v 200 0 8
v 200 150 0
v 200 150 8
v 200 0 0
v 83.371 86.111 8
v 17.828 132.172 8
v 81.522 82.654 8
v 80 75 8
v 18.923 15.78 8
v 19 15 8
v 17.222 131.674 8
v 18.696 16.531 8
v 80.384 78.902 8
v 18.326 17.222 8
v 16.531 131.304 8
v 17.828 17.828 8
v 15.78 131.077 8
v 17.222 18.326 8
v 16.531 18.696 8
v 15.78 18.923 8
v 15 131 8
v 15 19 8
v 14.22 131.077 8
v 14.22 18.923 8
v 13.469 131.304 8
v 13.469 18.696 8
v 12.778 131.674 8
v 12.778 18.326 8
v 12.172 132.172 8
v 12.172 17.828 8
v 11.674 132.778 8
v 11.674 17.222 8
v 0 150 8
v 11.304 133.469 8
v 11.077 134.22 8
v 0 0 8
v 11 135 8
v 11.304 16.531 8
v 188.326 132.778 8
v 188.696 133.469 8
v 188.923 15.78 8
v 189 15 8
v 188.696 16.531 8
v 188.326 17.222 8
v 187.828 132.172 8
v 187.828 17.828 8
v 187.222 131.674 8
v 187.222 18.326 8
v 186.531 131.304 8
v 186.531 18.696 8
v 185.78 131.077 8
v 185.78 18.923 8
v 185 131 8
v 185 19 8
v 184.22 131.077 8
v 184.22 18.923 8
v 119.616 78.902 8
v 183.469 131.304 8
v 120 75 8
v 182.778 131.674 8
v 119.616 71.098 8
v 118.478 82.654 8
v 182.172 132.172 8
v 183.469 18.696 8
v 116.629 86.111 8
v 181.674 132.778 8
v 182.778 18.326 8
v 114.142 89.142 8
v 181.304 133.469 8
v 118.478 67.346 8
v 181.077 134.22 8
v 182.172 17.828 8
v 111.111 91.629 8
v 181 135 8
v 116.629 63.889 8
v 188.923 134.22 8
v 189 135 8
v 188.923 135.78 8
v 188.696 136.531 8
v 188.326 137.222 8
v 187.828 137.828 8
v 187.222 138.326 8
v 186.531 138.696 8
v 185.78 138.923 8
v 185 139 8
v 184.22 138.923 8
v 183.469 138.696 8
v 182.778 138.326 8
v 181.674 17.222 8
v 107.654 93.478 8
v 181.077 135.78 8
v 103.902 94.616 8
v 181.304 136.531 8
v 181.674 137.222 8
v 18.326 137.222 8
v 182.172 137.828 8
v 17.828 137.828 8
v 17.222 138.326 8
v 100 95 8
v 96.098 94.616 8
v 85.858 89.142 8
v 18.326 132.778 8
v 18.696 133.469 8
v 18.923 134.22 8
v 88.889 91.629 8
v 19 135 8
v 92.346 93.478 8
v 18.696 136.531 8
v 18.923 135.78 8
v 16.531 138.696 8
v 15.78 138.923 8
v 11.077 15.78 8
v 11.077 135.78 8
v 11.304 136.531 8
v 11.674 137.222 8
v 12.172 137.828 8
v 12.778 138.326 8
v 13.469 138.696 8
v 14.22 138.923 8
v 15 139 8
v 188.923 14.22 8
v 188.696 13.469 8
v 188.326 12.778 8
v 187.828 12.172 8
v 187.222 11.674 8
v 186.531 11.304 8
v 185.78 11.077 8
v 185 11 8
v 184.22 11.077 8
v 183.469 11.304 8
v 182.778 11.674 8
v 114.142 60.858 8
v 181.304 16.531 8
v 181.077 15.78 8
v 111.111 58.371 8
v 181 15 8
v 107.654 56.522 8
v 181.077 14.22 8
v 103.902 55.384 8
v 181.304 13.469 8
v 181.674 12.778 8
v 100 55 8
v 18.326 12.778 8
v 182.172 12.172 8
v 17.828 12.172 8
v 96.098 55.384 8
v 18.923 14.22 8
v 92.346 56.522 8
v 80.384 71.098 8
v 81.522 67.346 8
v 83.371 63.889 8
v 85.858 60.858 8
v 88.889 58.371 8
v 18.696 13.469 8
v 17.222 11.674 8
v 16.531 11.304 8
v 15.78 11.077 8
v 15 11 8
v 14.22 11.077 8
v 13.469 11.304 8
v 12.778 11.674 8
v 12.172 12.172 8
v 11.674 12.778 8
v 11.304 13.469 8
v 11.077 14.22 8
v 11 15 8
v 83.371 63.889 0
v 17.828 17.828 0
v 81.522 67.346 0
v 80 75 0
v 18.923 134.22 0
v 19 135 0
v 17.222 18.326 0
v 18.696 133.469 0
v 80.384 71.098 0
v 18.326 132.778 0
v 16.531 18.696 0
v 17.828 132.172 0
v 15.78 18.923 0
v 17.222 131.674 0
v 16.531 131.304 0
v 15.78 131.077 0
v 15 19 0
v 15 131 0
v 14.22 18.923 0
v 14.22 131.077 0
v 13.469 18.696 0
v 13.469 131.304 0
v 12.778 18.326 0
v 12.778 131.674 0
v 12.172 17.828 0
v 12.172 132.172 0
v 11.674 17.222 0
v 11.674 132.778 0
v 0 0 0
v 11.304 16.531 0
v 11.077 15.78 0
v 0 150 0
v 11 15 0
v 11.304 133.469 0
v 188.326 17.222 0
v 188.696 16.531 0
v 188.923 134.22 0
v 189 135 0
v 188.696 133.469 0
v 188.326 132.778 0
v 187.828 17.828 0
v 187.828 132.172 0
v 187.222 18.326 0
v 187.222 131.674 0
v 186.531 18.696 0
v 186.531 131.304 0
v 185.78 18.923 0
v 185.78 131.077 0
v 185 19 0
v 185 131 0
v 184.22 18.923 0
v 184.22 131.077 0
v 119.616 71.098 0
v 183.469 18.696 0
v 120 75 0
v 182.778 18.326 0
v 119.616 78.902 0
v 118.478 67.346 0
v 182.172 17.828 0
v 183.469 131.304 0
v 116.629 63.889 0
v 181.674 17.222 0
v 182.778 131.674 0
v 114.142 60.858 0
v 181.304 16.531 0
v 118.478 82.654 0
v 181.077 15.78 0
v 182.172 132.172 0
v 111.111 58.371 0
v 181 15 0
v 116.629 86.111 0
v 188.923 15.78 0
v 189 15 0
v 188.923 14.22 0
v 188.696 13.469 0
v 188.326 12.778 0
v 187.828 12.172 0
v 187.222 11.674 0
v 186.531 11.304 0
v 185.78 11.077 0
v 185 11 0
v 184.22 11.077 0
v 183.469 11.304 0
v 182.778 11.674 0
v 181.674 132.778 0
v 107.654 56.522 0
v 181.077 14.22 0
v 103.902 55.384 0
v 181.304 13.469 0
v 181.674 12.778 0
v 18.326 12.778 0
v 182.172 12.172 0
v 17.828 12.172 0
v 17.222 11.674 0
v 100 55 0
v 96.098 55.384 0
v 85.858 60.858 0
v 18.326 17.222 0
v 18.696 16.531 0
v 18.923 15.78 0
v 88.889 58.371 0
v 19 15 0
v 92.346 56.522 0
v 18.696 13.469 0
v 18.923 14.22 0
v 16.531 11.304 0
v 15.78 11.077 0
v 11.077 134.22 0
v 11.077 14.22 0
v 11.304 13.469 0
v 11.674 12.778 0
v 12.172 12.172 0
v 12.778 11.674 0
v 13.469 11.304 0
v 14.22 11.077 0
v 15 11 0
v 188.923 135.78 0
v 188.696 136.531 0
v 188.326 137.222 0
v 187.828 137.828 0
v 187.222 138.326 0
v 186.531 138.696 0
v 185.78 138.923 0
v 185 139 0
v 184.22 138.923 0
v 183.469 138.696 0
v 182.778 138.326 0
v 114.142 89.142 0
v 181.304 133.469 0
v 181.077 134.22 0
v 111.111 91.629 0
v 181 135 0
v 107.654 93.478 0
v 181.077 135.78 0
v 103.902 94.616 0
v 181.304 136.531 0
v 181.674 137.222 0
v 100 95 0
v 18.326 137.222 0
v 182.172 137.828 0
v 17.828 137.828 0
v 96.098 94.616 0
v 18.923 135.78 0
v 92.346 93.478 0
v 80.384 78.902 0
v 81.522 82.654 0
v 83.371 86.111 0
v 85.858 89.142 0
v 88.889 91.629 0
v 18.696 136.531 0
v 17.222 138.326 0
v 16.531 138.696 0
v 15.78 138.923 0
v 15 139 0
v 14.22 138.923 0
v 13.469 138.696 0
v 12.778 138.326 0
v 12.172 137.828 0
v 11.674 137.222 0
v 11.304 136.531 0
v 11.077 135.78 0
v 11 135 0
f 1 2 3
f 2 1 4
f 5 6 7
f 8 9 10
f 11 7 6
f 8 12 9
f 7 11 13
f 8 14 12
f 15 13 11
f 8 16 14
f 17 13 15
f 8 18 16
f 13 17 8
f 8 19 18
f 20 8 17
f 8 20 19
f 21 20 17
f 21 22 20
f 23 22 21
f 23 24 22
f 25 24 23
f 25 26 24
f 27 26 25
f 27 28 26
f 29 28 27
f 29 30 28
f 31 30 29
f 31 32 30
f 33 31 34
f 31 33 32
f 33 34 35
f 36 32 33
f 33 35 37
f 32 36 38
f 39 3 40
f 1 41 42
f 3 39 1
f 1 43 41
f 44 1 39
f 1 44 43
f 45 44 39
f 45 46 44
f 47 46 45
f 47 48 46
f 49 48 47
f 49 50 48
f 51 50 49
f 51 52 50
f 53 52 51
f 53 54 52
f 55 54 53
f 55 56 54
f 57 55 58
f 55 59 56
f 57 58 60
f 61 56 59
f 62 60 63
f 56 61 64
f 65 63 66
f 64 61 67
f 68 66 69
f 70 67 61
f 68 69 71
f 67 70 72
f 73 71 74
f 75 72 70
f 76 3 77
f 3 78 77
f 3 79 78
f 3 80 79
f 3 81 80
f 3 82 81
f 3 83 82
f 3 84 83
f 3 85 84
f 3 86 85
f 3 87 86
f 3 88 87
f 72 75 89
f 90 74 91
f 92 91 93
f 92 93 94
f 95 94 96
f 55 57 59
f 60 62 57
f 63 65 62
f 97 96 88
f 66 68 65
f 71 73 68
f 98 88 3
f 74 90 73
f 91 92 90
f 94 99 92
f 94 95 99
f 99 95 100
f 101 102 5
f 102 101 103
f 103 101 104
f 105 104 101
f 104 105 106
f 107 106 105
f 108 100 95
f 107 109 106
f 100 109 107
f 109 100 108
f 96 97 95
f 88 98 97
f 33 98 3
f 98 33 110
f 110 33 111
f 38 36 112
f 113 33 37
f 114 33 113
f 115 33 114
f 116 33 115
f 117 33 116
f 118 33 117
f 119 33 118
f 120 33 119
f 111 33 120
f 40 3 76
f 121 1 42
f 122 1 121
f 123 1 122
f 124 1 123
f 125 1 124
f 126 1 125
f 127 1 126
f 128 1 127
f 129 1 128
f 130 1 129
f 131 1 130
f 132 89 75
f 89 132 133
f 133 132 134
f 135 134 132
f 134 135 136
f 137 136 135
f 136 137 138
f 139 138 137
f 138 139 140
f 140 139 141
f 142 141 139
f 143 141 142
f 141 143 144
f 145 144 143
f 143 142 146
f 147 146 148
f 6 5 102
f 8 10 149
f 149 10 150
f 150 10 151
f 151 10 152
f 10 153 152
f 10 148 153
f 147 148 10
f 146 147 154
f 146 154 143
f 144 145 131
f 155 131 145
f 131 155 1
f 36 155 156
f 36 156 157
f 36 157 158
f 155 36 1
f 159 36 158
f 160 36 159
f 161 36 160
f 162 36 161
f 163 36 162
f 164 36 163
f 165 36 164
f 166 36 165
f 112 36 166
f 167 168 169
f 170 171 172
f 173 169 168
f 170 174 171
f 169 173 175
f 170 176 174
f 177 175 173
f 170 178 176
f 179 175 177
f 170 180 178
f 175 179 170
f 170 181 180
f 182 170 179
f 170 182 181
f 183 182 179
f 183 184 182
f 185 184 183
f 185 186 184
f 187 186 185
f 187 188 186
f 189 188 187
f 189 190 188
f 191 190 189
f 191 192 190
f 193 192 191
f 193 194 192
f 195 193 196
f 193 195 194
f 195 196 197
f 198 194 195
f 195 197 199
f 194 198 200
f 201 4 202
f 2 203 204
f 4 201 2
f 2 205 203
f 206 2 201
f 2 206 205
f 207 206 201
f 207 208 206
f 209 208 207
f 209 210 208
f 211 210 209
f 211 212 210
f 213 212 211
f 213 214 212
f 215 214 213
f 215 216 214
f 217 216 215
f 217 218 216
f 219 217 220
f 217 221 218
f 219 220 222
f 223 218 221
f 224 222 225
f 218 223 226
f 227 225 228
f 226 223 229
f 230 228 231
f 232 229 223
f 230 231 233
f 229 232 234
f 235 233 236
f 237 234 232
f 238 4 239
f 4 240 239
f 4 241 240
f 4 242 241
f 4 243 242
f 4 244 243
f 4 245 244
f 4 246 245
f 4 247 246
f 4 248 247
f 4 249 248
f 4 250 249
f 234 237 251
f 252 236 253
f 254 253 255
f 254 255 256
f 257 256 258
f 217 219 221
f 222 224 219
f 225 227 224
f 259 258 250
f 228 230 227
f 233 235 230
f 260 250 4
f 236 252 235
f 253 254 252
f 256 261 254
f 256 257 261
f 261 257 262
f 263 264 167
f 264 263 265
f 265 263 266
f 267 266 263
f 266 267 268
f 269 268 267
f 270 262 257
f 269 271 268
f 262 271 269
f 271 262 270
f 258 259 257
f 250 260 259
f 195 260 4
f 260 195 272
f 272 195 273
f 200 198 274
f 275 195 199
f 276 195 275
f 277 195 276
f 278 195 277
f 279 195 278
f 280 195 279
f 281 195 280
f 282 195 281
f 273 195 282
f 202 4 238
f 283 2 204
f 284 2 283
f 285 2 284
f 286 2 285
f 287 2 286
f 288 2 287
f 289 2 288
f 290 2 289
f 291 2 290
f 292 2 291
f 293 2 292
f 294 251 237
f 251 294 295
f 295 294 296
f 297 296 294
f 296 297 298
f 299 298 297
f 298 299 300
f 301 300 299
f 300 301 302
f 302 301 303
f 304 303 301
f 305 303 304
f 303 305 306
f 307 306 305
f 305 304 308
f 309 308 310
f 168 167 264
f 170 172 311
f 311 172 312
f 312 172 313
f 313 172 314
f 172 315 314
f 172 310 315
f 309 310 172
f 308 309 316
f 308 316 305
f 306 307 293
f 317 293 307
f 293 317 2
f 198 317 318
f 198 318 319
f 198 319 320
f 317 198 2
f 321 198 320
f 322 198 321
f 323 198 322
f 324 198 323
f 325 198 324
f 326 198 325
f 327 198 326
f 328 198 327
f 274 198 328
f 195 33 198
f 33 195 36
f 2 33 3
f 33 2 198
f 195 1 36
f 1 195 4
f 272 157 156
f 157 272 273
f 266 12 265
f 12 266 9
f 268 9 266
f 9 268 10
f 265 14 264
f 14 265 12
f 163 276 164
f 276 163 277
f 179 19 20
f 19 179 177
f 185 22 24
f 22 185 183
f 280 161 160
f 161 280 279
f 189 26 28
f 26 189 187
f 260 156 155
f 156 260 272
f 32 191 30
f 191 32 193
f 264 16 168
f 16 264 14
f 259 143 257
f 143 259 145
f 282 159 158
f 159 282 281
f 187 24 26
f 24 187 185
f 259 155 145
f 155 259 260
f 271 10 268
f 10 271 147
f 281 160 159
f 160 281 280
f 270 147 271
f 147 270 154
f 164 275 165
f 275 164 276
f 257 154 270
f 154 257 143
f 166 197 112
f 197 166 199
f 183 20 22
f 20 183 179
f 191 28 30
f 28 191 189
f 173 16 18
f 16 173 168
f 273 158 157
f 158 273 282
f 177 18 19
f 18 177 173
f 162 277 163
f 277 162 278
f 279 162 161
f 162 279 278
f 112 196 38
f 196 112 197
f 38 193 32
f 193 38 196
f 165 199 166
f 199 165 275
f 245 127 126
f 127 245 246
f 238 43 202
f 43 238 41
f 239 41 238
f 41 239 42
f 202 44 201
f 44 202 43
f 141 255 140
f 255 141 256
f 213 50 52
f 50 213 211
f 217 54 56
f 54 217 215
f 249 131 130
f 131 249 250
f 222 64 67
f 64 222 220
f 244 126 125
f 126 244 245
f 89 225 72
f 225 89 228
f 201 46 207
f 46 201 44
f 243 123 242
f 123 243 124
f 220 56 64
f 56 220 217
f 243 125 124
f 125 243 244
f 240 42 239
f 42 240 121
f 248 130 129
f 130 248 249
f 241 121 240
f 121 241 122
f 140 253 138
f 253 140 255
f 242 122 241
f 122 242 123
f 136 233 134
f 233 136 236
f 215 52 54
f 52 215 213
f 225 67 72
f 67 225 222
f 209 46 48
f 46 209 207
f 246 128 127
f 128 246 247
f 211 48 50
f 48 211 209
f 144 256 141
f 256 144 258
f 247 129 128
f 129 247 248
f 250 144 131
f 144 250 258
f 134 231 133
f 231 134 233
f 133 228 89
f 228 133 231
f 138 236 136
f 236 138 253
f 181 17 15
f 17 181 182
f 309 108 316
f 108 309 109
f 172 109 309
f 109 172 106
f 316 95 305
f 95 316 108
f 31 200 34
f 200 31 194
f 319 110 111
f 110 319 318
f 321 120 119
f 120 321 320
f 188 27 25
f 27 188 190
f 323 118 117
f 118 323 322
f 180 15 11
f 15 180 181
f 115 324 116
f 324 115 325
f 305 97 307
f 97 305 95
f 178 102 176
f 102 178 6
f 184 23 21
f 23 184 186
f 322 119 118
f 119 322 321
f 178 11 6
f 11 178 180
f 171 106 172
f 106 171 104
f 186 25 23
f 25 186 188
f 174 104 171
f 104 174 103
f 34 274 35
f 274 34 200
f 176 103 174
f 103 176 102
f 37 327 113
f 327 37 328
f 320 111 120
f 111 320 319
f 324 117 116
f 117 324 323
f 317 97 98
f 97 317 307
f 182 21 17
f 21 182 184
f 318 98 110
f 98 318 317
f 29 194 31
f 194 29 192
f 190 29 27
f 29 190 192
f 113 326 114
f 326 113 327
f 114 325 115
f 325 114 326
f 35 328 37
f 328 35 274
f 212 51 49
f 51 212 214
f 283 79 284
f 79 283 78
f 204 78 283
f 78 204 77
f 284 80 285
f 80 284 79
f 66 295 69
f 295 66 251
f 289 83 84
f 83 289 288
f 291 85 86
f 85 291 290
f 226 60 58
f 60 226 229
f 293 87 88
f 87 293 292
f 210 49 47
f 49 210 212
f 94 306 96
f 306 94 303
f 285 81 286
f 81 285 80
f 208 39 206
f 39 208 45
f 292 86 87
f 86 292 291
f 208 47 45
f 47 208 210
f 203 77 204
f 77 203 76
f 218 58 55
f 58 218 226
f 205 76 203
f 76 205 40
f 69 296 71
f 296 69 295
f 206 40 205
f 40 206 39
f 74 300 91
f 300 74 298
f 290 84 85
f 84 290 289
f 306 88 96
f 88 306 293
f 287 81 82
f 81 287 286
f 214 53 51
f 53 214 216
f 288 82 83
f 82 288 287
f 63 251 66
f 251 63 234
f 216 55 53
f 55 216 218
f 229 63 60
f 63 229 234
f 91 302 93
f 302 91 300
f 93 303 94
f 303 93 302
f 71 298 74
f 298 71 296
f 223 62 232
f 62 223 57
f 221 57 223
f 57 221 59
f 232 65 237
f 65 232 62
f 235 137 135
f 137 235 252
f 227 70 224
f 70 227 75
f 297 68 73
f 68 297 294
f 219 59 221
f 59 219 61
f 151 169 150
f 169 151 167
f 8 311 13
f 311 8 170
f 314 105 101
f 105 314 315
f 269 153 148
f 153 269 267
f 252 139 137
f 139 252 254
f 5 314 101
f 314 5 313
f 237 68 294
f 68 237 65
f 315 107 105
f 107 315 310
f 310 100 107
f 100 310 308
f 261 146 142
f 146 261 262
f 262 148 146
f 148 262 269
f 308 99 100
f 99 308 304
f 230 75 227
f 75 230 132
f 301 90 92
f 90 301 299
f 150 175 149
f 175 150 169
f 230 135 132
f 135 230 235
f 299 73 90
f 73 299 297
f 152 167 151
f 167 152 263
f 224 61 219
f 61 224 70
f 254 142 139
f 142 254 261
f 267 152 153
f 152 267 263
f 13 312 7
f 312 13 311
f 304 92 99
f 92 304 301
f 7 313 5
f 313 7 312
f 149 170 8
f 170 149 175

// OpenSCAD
$fn = 32;

// ----------------------------------------------------------------------
// Big plate: 200-250 mm adapter plate
// ----------------------------------------------------------------------

// --- parameters (mm) ---
plate_l = 200;            // plate length, X
plate_w = 150;            // plate width, Y
plate_t = 8;              // plate thickness, Z
corner_d = 8;             // corner hole diameter
corner_in = 15;           // corner hole inset from the edges
bore_d = 40;              // central bore

difference() {
  cube([plate_l, plate_w, plate_t]);
  translate([corner_in, corner_in, -1]) cylinder(h = plate_t + 2, d = corner_d);
  translate([plate_l - corner_in, corner_in, -1]) cylinder(h = plate_t + 2, d = corner_d);
  translate([corner_in, plate_w - corner_in, -1]) cylinder(h = plate_t + 2, d = corner_d);
  translate([plate_l - corner_in, plate_w - corner_in, -1]) cylinder(h = plate_t + 2, d = corner_d);
  translate([plate_l / 2, plate_w / 2, -1]) cylinder(h = plate_t + 2, d = bore_d);
}
